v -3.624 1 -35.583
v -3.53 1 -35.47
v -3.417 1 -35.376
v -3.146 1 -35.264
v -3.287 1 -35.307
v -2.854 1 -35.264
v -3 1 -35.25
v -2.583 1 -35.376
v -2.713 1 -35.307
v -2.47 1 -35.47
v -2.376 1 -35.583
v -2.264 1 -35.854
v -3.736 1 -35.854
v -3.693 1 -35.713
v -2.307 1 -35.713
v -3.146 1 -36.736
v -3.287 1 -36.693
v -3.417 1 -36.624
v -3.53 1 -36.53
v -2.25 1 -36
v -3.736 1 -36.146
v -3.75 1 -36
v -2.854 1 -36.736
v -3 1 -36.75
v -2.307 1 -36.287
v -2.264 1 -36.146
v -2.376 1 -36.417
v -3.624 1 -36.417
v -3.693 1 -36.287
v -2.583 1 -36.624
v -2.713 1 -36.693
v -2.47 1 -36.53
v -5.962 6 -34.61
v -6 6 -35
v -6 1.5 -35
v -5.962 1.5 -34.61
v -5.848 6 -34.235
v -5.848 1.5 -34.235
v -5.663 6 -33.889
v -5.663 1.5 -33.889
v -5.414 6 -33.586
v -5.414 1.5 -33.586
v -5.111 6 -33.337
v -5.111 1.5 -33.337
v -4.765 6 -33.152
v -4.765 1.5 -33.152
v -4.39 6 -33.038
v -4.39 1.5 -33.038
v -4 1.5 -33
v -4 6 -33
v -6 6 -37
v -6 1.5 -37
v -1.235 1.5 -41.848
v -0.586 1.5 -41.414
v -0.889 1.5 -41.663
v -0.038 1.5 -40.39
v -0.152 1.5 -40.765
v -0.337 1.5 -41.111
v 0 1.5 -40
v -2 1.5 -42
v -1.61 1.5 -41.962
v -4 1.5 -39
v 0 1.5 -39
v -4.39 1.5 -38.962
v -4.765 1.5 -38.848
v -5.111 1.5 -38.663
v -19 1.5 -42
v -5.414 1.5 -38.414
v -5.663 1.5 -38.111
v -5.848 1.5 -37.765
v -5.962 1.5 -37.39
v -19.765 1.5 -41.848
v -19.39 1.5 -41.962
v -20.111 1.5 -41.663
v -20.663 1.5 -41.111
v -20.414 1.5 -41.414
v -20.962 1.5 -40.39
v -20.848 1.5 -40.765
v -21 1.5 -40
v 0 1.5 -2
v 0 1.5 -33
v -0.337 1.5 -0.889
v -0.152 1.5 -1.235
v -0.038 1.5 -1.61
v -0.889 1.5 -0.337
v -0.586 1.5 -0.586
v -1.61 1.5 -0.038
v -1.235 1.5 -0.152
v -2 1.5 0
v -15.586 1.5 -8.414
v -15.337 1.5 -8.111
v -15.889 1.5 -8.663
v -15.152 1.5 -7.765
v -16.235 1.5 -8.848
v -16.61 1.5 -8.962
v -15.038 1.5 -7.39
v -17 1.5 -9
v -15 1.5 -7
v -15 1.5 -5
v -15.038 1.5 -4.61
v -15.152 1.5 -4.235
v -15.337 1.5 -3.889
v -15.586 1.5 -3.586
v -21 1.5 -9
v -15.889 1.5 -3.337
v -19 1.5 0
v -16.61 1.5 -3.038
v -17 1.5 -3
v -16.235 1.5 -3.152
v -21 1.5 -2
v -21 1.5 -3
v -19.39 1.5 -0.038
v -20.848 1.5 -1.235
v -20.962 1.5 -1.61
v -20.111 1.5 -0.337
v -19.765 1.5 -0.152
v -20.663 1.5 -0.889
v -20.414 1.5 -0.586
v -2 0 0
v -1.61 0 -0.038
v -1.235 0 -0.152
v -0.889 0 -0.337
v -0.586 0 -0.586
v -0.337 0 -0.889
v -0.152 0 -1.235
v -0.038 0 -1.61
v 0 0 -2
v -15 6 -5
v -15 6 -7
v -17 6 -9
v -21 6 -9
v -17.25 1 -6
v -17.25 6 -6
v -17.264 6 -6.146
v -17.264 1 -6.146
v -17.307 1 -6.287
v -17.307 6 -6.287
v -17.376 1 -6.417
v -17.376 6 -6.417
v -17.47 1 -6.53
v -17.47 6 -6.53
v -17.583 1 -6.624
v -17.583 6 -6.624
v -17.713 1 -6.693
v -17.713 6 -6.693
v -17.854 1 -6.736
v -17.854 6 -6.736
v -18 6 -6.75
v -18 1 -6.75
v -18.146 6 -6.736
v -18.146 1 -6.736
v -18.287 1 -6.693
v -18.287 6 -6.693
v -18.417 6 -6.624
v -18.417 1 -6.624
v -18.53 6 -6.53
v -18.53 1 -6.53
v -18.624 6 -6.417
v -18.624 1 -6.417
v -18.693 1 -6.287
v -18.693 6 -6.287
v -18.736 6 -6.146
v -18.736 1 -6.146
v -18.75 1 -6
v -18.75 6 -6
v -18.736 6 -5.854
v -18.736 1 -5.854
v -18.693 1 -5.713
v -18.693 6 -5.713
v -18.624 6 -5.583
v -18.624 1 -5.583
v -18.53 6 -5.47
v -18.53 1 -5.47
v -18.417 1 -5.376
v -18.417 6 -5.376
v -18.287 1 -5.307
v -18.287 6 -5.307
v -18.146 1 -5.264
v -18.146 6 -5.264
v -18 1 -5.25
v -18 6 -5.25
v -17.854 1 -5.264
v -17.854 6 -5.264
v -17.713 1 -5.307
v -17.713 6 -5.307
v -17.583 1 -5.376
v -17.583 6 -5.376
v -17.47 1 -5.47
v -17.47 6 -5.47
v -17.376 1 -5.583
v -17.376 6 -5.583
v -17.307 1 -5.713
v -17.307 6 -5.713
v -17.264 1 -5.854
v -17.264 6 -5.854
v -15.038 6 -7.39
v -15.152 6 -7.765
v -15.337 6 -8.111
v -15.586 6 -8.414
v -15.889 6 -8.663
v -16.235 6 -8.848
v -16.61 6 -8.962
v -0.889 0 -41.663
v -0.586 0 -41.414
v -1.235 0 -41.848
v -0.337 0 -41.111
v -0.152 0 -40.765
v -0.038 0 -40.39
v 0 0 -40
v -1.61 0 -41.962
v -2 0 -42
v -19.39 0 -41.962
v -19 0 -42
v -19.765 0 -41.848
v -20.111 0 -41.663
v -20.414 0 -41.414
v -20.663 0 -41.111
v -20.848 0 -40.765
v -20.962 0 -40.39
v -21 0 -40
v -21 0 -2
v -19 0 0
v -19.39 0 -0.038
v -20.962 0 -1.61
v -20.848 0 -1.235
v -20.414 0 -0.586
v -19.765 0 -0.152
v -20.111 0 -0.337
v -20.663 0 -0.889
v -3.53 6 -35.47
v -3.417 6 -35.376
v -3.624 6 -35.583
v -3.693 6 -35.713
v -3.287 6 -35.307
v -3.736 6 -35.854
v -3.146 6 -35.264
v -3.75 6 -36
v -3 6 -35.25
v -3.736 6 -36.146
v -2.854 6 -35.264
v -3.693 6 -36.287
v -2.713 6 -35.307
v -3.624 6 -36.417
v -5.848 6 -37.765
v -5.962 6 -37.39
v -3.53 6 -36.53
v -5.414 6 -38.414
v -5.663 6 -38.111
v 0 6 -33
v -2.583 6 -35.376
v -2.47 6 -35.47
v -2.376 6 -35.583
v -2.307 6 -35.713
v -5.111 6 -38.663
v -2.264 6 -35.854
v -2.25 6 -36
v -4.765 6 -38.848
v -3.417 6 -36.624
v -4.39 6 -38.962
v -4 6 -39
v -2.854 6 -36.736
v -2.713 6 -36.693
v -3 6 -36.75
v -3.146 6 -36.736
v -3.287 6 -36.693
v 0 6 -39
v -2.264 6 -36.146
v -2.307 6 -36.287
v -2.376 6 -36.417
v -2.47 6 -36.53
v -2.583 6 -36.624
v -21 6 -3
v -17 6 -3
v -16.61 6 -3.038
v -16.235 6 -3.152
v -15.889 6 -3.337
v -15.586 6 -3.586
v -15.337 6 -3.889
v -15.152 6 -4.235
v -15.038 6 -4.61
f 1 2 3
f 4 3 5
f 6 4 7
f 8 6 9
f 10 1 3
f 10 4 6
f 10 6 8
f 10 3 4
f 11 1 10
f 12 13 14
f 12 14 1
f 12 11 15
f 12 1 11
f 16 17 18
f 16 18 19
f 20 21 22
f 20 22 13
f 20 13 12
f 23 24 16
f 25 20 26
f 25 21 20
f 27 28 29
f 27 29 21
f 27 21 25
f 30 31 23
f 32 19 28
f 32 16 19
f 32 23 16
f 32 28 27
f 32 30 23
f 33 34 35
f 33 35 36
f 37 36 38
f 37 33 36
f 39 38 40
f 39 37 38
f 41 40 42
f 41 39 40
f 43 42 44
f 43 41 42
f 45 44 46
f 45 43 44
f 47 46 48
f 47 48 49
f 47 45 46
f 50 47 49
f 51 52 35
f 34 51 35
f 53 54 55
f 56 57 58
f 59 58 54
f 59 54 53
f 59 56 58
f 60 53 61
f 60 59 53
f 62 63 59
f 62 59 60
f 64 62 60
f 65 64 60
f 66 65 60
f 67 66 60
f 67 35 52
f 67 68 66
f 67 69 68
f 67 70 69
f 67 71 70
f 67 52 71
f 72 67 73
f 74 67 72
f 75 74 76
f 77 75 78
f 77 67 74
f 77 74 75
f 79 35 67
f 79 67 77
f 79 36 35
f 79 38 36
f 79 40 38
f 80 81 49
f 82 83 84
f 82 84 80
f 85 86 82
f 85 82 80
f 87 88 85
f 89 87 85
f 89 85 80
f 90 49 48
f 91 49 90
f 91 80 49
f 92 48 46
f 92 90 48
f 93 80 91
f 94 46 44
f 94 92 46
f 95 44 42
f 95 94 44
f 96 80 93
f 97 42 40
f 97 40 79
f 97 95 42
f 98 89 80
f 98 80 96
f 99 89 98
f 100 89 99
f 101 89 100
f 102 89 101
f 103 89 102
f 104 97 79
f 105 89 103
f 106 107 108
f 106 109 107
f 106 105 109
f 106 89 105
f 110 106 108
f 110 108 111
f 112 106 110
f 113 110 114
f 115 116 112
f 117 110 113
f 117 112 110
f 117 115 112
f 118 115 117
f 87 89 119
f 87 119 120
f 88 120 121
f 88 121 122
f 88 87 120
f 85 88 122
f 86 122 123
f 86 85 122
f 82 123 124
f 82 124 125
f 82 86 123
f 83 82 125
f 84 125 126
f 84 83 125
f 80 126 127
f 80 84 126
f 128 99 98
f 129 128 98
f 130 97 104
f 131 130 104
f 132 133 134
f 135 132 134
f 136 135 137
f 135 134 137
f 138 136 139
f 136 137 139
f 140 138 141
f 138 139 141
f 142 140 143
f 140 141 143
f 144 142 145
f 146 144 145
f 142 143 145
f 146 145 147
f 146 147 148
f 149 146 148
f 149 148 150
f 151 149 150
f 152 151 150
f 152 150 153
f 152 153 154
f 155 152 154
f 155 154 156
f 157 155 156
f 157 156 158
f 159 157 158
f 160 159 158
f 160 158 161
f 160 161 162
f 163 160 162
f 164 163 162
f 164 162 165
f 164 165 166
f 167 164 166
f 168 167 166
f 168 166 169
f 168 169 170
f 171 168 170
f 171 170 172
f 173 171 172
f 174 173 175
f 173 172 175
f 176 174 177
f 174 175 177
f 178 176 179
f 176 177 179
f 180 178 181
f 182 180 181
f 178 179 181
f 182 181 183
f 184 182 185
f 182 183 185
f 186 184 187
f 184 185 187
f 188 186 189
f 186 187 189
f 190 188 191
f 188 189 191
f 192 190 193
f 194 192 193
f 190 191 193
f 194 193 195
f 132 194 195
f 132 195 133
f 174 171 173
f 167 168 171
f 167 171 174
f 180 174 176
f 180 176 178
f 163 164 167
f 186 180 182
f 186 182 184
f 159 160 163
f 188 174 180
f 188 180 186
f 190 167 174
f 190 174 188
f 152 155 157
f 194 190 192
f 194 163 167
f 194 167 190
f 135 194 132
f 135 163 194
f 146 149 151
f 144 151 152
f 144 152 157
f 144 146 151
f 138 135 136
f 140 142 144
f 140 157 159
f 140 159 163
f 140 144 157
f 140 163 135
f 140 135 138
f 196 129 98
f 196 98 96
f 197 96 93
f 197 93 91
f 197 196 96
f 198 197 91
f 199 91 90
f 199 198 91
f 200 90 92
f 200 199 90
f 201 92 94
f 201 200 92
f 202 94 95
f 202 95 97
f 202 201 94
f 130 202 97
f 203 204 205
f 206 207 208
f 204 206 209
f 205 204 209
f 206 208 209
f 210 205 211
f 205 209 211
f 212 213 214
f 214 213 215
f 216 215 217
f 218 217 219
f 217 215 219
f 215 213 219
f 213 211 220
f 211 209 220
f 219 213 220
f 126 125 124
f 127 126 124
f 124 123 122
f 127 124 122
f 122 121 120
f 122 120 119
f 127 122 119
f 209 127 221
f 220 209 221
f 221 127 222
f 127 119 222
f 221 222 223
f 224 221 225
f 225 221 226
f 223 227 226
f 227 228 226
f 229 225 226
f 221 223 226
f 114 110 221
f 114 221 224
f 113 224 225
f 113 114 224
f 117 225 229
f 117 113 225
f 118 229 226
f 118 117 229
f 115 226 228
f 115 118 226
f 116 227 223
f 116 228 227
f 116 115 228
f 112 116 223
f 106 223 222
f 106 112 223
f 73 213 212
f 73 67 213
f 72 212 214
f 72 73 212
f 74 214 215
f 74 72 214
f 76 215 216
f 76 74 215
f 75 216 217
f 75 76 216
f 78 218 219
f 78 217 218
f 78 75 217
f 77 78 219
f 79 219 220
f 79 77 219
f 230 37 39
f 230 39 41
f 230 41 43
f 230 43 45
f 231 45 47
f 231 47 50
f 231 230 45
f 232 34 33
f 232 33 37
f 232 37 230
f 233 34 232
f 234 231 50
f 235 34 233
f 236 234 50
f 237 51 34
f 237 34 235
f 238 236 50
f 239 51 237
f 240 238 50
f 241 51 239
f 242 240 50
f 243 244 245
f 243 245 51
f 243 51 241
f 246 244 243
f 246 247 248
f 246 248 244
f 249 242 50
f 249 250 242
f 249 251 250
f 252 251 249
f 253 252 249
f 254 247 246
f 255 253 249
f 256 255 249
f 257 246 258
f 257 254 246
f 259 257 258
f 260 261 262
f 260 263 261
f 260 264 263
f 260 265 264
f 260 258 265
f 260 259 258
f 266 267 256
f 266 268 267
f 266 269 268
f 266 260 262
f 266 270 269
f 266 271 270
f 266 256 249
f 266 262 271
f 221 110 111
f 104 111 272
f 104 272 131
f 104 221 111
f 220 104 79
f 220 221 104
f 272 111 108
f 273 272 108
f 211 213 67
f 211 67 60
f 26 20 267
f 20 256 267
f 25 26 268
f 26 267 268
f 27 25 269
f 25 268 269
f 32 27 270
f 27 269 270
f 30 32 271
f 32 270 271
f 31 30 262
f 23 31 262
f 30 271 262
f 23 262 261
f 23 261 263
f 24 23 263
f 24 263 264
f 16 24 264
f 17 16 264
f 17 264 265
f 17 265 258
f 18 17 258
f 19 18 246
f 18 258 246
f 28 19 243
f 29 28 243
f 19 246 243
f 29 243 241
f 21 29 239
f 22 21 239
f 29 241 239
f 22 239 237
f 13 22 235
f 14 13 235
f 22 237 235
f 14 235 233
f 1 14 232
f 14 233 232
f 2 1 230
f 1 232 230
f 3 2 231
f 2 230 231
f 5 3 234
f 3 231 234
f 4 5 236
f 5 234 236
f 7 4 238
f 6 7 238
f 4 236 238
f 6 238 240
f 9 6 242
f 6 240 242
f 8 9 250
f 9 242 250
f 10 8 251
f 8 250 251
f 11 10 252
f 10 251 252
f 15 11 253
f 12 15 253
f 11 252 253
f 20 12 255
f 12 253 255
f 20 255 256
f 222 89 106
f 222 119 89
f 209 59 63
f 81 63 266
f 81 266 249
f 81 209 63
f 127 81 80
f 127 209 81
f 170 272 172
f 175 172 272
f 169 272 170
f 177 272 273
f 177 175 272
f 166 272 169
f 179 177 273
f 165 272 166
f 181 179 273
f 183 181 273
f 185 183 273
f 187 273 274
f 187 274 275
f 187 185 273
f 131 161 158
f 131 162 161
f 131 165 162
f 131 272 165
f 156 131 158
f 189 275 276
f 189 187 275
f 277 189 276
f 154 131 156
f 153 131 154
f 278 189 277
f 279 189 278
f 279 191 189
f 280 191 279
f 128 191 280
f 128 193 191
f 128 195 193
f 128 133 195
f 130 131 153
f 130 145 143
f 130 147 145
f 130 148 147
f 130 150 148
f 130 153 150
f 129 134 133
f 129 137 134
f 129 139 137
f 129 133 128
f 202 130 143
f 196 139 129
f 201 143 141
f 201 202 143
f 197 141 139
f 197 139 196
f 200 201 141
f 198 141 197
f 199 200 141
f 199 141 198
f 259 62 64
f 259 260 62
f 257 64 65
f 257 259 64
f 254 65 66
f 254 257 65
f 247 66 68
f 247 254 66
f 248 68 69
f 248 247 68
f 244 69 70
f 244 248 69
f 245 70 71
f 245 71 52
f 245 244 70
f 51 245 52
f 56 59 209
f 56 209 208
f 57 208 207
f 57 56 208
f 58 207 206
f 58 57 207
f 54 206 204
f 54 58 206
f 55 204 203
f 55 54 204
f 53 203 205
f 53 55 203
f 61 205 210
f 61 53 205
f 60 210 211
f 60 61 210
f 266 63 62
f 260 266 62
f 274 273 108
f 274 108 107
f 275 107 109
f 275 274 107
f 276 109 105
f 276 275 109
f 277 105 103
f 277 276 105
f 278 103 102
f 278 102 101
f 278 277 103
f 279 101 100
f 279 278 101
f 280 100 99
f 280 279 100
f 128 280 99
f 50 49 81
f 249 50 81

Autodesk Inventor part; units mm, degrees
ref_plane "YZ Plane" through (0, 0, 0) normal (1, 0, 0) x (0, 1, 0)
ref_plane "XZ Plane" through (0, 0, 0) normal (0, 1, 0) x (-1, 0, 0)
ref_plane "XY Plane" through (0, 0, 0) normal (0, 0, 1) x (1, 0, 0)
sketch "Эскиз1" plane through (0, 0, 0) normal (0, 1, 0) x (-1, 0, 0)
  line L0 (0, 0) -> (21, 0)
  line L1 (21, 0) -> (21, -42)
  line L2 (21, -42) -> (0, -42)
  line L3 (0, -42) -> (0, 0)
  dimension "d0" = 21
  dimension "d1" = 42
extrude "Выдавливание1" add sketch "Эскиз1" along normal blind 1.5
sketch "Эскиз2" plane through (0, 1.5, 0) normal (0, 1, 0) x (1, 0, 0)
  line L0 (0, 0) -> (0, 42) projected
  line L1 (0, 39) -> (-6, 39)
  line L2 (-6, 39) -> (-6, 33)
  line L3 (-6, 33) -> (0, 33)
  line L4 (0, 33) -> (0, 39)
  line L5 (0, 42) -> (-21, 42) projected
  line L6 (-21, 42) -> (-21, 0) projected
  line L7 (-21, 3) -> (-15, 3)
  line L8 (-15, 3) -> (-15, 9)
  line L9 (-15, 9) -> (-21, 9)
  line L10 (-21, 9) -> (-21, 3)
  line L11 (-21, 0) -> (0, 0) projected
  point P0 (0, 33)
  dimension "d4" = 6
  dimension "d5" = 6
  dimension "d6" = 3
  dimension "d7" = 6
  dimension "d8" = 6
  dimension "d9" = 3
extrude "Выдавливание2" add sketch "Эскиз2" along normal blind 4.5 contours L3 L2 L1 L0 | L6 L9 L8 L7
fillet "Сопряжение1" radius 2 8 edges at (-15, 3.75, -3) (-15, 3.75, -9) (-6, 3.75, -33) (-6, 3.75, -39) (0, 0.75, 0) (0, 0.75, -42) (-21, 0.75, 0) (-21, 0.75, -42)
sketch "Эскиз3" plane through (0, 6, 0) normal (0, 1, 0) x (1, 0, 0)
  circle A0 centre (-18, 6) radius 0.75
  line L0 (-21, 9) -> (-21, 3) projected
  line L1 (-17, 9) -> (-21, 9) projected
  circle A1 centre (-3, 36) radius 0.75
  line L2 (0, 39) -> (-4, 39) projected
  line L3 (0, 33) -> (0, 39) projected
  point P0 (0, 0)
  dimension "d13" = 1.5
  dimension "d14" = 3
  dimension "d15" = 3
  dimension "d16" = 1.5
  dimension "d17" = 3
  dimension "d18" = 3
extrude "Выдавливание3" cut sketch "Эскиз3" against normal blind 5
properties part number "DCDC_Holder"
